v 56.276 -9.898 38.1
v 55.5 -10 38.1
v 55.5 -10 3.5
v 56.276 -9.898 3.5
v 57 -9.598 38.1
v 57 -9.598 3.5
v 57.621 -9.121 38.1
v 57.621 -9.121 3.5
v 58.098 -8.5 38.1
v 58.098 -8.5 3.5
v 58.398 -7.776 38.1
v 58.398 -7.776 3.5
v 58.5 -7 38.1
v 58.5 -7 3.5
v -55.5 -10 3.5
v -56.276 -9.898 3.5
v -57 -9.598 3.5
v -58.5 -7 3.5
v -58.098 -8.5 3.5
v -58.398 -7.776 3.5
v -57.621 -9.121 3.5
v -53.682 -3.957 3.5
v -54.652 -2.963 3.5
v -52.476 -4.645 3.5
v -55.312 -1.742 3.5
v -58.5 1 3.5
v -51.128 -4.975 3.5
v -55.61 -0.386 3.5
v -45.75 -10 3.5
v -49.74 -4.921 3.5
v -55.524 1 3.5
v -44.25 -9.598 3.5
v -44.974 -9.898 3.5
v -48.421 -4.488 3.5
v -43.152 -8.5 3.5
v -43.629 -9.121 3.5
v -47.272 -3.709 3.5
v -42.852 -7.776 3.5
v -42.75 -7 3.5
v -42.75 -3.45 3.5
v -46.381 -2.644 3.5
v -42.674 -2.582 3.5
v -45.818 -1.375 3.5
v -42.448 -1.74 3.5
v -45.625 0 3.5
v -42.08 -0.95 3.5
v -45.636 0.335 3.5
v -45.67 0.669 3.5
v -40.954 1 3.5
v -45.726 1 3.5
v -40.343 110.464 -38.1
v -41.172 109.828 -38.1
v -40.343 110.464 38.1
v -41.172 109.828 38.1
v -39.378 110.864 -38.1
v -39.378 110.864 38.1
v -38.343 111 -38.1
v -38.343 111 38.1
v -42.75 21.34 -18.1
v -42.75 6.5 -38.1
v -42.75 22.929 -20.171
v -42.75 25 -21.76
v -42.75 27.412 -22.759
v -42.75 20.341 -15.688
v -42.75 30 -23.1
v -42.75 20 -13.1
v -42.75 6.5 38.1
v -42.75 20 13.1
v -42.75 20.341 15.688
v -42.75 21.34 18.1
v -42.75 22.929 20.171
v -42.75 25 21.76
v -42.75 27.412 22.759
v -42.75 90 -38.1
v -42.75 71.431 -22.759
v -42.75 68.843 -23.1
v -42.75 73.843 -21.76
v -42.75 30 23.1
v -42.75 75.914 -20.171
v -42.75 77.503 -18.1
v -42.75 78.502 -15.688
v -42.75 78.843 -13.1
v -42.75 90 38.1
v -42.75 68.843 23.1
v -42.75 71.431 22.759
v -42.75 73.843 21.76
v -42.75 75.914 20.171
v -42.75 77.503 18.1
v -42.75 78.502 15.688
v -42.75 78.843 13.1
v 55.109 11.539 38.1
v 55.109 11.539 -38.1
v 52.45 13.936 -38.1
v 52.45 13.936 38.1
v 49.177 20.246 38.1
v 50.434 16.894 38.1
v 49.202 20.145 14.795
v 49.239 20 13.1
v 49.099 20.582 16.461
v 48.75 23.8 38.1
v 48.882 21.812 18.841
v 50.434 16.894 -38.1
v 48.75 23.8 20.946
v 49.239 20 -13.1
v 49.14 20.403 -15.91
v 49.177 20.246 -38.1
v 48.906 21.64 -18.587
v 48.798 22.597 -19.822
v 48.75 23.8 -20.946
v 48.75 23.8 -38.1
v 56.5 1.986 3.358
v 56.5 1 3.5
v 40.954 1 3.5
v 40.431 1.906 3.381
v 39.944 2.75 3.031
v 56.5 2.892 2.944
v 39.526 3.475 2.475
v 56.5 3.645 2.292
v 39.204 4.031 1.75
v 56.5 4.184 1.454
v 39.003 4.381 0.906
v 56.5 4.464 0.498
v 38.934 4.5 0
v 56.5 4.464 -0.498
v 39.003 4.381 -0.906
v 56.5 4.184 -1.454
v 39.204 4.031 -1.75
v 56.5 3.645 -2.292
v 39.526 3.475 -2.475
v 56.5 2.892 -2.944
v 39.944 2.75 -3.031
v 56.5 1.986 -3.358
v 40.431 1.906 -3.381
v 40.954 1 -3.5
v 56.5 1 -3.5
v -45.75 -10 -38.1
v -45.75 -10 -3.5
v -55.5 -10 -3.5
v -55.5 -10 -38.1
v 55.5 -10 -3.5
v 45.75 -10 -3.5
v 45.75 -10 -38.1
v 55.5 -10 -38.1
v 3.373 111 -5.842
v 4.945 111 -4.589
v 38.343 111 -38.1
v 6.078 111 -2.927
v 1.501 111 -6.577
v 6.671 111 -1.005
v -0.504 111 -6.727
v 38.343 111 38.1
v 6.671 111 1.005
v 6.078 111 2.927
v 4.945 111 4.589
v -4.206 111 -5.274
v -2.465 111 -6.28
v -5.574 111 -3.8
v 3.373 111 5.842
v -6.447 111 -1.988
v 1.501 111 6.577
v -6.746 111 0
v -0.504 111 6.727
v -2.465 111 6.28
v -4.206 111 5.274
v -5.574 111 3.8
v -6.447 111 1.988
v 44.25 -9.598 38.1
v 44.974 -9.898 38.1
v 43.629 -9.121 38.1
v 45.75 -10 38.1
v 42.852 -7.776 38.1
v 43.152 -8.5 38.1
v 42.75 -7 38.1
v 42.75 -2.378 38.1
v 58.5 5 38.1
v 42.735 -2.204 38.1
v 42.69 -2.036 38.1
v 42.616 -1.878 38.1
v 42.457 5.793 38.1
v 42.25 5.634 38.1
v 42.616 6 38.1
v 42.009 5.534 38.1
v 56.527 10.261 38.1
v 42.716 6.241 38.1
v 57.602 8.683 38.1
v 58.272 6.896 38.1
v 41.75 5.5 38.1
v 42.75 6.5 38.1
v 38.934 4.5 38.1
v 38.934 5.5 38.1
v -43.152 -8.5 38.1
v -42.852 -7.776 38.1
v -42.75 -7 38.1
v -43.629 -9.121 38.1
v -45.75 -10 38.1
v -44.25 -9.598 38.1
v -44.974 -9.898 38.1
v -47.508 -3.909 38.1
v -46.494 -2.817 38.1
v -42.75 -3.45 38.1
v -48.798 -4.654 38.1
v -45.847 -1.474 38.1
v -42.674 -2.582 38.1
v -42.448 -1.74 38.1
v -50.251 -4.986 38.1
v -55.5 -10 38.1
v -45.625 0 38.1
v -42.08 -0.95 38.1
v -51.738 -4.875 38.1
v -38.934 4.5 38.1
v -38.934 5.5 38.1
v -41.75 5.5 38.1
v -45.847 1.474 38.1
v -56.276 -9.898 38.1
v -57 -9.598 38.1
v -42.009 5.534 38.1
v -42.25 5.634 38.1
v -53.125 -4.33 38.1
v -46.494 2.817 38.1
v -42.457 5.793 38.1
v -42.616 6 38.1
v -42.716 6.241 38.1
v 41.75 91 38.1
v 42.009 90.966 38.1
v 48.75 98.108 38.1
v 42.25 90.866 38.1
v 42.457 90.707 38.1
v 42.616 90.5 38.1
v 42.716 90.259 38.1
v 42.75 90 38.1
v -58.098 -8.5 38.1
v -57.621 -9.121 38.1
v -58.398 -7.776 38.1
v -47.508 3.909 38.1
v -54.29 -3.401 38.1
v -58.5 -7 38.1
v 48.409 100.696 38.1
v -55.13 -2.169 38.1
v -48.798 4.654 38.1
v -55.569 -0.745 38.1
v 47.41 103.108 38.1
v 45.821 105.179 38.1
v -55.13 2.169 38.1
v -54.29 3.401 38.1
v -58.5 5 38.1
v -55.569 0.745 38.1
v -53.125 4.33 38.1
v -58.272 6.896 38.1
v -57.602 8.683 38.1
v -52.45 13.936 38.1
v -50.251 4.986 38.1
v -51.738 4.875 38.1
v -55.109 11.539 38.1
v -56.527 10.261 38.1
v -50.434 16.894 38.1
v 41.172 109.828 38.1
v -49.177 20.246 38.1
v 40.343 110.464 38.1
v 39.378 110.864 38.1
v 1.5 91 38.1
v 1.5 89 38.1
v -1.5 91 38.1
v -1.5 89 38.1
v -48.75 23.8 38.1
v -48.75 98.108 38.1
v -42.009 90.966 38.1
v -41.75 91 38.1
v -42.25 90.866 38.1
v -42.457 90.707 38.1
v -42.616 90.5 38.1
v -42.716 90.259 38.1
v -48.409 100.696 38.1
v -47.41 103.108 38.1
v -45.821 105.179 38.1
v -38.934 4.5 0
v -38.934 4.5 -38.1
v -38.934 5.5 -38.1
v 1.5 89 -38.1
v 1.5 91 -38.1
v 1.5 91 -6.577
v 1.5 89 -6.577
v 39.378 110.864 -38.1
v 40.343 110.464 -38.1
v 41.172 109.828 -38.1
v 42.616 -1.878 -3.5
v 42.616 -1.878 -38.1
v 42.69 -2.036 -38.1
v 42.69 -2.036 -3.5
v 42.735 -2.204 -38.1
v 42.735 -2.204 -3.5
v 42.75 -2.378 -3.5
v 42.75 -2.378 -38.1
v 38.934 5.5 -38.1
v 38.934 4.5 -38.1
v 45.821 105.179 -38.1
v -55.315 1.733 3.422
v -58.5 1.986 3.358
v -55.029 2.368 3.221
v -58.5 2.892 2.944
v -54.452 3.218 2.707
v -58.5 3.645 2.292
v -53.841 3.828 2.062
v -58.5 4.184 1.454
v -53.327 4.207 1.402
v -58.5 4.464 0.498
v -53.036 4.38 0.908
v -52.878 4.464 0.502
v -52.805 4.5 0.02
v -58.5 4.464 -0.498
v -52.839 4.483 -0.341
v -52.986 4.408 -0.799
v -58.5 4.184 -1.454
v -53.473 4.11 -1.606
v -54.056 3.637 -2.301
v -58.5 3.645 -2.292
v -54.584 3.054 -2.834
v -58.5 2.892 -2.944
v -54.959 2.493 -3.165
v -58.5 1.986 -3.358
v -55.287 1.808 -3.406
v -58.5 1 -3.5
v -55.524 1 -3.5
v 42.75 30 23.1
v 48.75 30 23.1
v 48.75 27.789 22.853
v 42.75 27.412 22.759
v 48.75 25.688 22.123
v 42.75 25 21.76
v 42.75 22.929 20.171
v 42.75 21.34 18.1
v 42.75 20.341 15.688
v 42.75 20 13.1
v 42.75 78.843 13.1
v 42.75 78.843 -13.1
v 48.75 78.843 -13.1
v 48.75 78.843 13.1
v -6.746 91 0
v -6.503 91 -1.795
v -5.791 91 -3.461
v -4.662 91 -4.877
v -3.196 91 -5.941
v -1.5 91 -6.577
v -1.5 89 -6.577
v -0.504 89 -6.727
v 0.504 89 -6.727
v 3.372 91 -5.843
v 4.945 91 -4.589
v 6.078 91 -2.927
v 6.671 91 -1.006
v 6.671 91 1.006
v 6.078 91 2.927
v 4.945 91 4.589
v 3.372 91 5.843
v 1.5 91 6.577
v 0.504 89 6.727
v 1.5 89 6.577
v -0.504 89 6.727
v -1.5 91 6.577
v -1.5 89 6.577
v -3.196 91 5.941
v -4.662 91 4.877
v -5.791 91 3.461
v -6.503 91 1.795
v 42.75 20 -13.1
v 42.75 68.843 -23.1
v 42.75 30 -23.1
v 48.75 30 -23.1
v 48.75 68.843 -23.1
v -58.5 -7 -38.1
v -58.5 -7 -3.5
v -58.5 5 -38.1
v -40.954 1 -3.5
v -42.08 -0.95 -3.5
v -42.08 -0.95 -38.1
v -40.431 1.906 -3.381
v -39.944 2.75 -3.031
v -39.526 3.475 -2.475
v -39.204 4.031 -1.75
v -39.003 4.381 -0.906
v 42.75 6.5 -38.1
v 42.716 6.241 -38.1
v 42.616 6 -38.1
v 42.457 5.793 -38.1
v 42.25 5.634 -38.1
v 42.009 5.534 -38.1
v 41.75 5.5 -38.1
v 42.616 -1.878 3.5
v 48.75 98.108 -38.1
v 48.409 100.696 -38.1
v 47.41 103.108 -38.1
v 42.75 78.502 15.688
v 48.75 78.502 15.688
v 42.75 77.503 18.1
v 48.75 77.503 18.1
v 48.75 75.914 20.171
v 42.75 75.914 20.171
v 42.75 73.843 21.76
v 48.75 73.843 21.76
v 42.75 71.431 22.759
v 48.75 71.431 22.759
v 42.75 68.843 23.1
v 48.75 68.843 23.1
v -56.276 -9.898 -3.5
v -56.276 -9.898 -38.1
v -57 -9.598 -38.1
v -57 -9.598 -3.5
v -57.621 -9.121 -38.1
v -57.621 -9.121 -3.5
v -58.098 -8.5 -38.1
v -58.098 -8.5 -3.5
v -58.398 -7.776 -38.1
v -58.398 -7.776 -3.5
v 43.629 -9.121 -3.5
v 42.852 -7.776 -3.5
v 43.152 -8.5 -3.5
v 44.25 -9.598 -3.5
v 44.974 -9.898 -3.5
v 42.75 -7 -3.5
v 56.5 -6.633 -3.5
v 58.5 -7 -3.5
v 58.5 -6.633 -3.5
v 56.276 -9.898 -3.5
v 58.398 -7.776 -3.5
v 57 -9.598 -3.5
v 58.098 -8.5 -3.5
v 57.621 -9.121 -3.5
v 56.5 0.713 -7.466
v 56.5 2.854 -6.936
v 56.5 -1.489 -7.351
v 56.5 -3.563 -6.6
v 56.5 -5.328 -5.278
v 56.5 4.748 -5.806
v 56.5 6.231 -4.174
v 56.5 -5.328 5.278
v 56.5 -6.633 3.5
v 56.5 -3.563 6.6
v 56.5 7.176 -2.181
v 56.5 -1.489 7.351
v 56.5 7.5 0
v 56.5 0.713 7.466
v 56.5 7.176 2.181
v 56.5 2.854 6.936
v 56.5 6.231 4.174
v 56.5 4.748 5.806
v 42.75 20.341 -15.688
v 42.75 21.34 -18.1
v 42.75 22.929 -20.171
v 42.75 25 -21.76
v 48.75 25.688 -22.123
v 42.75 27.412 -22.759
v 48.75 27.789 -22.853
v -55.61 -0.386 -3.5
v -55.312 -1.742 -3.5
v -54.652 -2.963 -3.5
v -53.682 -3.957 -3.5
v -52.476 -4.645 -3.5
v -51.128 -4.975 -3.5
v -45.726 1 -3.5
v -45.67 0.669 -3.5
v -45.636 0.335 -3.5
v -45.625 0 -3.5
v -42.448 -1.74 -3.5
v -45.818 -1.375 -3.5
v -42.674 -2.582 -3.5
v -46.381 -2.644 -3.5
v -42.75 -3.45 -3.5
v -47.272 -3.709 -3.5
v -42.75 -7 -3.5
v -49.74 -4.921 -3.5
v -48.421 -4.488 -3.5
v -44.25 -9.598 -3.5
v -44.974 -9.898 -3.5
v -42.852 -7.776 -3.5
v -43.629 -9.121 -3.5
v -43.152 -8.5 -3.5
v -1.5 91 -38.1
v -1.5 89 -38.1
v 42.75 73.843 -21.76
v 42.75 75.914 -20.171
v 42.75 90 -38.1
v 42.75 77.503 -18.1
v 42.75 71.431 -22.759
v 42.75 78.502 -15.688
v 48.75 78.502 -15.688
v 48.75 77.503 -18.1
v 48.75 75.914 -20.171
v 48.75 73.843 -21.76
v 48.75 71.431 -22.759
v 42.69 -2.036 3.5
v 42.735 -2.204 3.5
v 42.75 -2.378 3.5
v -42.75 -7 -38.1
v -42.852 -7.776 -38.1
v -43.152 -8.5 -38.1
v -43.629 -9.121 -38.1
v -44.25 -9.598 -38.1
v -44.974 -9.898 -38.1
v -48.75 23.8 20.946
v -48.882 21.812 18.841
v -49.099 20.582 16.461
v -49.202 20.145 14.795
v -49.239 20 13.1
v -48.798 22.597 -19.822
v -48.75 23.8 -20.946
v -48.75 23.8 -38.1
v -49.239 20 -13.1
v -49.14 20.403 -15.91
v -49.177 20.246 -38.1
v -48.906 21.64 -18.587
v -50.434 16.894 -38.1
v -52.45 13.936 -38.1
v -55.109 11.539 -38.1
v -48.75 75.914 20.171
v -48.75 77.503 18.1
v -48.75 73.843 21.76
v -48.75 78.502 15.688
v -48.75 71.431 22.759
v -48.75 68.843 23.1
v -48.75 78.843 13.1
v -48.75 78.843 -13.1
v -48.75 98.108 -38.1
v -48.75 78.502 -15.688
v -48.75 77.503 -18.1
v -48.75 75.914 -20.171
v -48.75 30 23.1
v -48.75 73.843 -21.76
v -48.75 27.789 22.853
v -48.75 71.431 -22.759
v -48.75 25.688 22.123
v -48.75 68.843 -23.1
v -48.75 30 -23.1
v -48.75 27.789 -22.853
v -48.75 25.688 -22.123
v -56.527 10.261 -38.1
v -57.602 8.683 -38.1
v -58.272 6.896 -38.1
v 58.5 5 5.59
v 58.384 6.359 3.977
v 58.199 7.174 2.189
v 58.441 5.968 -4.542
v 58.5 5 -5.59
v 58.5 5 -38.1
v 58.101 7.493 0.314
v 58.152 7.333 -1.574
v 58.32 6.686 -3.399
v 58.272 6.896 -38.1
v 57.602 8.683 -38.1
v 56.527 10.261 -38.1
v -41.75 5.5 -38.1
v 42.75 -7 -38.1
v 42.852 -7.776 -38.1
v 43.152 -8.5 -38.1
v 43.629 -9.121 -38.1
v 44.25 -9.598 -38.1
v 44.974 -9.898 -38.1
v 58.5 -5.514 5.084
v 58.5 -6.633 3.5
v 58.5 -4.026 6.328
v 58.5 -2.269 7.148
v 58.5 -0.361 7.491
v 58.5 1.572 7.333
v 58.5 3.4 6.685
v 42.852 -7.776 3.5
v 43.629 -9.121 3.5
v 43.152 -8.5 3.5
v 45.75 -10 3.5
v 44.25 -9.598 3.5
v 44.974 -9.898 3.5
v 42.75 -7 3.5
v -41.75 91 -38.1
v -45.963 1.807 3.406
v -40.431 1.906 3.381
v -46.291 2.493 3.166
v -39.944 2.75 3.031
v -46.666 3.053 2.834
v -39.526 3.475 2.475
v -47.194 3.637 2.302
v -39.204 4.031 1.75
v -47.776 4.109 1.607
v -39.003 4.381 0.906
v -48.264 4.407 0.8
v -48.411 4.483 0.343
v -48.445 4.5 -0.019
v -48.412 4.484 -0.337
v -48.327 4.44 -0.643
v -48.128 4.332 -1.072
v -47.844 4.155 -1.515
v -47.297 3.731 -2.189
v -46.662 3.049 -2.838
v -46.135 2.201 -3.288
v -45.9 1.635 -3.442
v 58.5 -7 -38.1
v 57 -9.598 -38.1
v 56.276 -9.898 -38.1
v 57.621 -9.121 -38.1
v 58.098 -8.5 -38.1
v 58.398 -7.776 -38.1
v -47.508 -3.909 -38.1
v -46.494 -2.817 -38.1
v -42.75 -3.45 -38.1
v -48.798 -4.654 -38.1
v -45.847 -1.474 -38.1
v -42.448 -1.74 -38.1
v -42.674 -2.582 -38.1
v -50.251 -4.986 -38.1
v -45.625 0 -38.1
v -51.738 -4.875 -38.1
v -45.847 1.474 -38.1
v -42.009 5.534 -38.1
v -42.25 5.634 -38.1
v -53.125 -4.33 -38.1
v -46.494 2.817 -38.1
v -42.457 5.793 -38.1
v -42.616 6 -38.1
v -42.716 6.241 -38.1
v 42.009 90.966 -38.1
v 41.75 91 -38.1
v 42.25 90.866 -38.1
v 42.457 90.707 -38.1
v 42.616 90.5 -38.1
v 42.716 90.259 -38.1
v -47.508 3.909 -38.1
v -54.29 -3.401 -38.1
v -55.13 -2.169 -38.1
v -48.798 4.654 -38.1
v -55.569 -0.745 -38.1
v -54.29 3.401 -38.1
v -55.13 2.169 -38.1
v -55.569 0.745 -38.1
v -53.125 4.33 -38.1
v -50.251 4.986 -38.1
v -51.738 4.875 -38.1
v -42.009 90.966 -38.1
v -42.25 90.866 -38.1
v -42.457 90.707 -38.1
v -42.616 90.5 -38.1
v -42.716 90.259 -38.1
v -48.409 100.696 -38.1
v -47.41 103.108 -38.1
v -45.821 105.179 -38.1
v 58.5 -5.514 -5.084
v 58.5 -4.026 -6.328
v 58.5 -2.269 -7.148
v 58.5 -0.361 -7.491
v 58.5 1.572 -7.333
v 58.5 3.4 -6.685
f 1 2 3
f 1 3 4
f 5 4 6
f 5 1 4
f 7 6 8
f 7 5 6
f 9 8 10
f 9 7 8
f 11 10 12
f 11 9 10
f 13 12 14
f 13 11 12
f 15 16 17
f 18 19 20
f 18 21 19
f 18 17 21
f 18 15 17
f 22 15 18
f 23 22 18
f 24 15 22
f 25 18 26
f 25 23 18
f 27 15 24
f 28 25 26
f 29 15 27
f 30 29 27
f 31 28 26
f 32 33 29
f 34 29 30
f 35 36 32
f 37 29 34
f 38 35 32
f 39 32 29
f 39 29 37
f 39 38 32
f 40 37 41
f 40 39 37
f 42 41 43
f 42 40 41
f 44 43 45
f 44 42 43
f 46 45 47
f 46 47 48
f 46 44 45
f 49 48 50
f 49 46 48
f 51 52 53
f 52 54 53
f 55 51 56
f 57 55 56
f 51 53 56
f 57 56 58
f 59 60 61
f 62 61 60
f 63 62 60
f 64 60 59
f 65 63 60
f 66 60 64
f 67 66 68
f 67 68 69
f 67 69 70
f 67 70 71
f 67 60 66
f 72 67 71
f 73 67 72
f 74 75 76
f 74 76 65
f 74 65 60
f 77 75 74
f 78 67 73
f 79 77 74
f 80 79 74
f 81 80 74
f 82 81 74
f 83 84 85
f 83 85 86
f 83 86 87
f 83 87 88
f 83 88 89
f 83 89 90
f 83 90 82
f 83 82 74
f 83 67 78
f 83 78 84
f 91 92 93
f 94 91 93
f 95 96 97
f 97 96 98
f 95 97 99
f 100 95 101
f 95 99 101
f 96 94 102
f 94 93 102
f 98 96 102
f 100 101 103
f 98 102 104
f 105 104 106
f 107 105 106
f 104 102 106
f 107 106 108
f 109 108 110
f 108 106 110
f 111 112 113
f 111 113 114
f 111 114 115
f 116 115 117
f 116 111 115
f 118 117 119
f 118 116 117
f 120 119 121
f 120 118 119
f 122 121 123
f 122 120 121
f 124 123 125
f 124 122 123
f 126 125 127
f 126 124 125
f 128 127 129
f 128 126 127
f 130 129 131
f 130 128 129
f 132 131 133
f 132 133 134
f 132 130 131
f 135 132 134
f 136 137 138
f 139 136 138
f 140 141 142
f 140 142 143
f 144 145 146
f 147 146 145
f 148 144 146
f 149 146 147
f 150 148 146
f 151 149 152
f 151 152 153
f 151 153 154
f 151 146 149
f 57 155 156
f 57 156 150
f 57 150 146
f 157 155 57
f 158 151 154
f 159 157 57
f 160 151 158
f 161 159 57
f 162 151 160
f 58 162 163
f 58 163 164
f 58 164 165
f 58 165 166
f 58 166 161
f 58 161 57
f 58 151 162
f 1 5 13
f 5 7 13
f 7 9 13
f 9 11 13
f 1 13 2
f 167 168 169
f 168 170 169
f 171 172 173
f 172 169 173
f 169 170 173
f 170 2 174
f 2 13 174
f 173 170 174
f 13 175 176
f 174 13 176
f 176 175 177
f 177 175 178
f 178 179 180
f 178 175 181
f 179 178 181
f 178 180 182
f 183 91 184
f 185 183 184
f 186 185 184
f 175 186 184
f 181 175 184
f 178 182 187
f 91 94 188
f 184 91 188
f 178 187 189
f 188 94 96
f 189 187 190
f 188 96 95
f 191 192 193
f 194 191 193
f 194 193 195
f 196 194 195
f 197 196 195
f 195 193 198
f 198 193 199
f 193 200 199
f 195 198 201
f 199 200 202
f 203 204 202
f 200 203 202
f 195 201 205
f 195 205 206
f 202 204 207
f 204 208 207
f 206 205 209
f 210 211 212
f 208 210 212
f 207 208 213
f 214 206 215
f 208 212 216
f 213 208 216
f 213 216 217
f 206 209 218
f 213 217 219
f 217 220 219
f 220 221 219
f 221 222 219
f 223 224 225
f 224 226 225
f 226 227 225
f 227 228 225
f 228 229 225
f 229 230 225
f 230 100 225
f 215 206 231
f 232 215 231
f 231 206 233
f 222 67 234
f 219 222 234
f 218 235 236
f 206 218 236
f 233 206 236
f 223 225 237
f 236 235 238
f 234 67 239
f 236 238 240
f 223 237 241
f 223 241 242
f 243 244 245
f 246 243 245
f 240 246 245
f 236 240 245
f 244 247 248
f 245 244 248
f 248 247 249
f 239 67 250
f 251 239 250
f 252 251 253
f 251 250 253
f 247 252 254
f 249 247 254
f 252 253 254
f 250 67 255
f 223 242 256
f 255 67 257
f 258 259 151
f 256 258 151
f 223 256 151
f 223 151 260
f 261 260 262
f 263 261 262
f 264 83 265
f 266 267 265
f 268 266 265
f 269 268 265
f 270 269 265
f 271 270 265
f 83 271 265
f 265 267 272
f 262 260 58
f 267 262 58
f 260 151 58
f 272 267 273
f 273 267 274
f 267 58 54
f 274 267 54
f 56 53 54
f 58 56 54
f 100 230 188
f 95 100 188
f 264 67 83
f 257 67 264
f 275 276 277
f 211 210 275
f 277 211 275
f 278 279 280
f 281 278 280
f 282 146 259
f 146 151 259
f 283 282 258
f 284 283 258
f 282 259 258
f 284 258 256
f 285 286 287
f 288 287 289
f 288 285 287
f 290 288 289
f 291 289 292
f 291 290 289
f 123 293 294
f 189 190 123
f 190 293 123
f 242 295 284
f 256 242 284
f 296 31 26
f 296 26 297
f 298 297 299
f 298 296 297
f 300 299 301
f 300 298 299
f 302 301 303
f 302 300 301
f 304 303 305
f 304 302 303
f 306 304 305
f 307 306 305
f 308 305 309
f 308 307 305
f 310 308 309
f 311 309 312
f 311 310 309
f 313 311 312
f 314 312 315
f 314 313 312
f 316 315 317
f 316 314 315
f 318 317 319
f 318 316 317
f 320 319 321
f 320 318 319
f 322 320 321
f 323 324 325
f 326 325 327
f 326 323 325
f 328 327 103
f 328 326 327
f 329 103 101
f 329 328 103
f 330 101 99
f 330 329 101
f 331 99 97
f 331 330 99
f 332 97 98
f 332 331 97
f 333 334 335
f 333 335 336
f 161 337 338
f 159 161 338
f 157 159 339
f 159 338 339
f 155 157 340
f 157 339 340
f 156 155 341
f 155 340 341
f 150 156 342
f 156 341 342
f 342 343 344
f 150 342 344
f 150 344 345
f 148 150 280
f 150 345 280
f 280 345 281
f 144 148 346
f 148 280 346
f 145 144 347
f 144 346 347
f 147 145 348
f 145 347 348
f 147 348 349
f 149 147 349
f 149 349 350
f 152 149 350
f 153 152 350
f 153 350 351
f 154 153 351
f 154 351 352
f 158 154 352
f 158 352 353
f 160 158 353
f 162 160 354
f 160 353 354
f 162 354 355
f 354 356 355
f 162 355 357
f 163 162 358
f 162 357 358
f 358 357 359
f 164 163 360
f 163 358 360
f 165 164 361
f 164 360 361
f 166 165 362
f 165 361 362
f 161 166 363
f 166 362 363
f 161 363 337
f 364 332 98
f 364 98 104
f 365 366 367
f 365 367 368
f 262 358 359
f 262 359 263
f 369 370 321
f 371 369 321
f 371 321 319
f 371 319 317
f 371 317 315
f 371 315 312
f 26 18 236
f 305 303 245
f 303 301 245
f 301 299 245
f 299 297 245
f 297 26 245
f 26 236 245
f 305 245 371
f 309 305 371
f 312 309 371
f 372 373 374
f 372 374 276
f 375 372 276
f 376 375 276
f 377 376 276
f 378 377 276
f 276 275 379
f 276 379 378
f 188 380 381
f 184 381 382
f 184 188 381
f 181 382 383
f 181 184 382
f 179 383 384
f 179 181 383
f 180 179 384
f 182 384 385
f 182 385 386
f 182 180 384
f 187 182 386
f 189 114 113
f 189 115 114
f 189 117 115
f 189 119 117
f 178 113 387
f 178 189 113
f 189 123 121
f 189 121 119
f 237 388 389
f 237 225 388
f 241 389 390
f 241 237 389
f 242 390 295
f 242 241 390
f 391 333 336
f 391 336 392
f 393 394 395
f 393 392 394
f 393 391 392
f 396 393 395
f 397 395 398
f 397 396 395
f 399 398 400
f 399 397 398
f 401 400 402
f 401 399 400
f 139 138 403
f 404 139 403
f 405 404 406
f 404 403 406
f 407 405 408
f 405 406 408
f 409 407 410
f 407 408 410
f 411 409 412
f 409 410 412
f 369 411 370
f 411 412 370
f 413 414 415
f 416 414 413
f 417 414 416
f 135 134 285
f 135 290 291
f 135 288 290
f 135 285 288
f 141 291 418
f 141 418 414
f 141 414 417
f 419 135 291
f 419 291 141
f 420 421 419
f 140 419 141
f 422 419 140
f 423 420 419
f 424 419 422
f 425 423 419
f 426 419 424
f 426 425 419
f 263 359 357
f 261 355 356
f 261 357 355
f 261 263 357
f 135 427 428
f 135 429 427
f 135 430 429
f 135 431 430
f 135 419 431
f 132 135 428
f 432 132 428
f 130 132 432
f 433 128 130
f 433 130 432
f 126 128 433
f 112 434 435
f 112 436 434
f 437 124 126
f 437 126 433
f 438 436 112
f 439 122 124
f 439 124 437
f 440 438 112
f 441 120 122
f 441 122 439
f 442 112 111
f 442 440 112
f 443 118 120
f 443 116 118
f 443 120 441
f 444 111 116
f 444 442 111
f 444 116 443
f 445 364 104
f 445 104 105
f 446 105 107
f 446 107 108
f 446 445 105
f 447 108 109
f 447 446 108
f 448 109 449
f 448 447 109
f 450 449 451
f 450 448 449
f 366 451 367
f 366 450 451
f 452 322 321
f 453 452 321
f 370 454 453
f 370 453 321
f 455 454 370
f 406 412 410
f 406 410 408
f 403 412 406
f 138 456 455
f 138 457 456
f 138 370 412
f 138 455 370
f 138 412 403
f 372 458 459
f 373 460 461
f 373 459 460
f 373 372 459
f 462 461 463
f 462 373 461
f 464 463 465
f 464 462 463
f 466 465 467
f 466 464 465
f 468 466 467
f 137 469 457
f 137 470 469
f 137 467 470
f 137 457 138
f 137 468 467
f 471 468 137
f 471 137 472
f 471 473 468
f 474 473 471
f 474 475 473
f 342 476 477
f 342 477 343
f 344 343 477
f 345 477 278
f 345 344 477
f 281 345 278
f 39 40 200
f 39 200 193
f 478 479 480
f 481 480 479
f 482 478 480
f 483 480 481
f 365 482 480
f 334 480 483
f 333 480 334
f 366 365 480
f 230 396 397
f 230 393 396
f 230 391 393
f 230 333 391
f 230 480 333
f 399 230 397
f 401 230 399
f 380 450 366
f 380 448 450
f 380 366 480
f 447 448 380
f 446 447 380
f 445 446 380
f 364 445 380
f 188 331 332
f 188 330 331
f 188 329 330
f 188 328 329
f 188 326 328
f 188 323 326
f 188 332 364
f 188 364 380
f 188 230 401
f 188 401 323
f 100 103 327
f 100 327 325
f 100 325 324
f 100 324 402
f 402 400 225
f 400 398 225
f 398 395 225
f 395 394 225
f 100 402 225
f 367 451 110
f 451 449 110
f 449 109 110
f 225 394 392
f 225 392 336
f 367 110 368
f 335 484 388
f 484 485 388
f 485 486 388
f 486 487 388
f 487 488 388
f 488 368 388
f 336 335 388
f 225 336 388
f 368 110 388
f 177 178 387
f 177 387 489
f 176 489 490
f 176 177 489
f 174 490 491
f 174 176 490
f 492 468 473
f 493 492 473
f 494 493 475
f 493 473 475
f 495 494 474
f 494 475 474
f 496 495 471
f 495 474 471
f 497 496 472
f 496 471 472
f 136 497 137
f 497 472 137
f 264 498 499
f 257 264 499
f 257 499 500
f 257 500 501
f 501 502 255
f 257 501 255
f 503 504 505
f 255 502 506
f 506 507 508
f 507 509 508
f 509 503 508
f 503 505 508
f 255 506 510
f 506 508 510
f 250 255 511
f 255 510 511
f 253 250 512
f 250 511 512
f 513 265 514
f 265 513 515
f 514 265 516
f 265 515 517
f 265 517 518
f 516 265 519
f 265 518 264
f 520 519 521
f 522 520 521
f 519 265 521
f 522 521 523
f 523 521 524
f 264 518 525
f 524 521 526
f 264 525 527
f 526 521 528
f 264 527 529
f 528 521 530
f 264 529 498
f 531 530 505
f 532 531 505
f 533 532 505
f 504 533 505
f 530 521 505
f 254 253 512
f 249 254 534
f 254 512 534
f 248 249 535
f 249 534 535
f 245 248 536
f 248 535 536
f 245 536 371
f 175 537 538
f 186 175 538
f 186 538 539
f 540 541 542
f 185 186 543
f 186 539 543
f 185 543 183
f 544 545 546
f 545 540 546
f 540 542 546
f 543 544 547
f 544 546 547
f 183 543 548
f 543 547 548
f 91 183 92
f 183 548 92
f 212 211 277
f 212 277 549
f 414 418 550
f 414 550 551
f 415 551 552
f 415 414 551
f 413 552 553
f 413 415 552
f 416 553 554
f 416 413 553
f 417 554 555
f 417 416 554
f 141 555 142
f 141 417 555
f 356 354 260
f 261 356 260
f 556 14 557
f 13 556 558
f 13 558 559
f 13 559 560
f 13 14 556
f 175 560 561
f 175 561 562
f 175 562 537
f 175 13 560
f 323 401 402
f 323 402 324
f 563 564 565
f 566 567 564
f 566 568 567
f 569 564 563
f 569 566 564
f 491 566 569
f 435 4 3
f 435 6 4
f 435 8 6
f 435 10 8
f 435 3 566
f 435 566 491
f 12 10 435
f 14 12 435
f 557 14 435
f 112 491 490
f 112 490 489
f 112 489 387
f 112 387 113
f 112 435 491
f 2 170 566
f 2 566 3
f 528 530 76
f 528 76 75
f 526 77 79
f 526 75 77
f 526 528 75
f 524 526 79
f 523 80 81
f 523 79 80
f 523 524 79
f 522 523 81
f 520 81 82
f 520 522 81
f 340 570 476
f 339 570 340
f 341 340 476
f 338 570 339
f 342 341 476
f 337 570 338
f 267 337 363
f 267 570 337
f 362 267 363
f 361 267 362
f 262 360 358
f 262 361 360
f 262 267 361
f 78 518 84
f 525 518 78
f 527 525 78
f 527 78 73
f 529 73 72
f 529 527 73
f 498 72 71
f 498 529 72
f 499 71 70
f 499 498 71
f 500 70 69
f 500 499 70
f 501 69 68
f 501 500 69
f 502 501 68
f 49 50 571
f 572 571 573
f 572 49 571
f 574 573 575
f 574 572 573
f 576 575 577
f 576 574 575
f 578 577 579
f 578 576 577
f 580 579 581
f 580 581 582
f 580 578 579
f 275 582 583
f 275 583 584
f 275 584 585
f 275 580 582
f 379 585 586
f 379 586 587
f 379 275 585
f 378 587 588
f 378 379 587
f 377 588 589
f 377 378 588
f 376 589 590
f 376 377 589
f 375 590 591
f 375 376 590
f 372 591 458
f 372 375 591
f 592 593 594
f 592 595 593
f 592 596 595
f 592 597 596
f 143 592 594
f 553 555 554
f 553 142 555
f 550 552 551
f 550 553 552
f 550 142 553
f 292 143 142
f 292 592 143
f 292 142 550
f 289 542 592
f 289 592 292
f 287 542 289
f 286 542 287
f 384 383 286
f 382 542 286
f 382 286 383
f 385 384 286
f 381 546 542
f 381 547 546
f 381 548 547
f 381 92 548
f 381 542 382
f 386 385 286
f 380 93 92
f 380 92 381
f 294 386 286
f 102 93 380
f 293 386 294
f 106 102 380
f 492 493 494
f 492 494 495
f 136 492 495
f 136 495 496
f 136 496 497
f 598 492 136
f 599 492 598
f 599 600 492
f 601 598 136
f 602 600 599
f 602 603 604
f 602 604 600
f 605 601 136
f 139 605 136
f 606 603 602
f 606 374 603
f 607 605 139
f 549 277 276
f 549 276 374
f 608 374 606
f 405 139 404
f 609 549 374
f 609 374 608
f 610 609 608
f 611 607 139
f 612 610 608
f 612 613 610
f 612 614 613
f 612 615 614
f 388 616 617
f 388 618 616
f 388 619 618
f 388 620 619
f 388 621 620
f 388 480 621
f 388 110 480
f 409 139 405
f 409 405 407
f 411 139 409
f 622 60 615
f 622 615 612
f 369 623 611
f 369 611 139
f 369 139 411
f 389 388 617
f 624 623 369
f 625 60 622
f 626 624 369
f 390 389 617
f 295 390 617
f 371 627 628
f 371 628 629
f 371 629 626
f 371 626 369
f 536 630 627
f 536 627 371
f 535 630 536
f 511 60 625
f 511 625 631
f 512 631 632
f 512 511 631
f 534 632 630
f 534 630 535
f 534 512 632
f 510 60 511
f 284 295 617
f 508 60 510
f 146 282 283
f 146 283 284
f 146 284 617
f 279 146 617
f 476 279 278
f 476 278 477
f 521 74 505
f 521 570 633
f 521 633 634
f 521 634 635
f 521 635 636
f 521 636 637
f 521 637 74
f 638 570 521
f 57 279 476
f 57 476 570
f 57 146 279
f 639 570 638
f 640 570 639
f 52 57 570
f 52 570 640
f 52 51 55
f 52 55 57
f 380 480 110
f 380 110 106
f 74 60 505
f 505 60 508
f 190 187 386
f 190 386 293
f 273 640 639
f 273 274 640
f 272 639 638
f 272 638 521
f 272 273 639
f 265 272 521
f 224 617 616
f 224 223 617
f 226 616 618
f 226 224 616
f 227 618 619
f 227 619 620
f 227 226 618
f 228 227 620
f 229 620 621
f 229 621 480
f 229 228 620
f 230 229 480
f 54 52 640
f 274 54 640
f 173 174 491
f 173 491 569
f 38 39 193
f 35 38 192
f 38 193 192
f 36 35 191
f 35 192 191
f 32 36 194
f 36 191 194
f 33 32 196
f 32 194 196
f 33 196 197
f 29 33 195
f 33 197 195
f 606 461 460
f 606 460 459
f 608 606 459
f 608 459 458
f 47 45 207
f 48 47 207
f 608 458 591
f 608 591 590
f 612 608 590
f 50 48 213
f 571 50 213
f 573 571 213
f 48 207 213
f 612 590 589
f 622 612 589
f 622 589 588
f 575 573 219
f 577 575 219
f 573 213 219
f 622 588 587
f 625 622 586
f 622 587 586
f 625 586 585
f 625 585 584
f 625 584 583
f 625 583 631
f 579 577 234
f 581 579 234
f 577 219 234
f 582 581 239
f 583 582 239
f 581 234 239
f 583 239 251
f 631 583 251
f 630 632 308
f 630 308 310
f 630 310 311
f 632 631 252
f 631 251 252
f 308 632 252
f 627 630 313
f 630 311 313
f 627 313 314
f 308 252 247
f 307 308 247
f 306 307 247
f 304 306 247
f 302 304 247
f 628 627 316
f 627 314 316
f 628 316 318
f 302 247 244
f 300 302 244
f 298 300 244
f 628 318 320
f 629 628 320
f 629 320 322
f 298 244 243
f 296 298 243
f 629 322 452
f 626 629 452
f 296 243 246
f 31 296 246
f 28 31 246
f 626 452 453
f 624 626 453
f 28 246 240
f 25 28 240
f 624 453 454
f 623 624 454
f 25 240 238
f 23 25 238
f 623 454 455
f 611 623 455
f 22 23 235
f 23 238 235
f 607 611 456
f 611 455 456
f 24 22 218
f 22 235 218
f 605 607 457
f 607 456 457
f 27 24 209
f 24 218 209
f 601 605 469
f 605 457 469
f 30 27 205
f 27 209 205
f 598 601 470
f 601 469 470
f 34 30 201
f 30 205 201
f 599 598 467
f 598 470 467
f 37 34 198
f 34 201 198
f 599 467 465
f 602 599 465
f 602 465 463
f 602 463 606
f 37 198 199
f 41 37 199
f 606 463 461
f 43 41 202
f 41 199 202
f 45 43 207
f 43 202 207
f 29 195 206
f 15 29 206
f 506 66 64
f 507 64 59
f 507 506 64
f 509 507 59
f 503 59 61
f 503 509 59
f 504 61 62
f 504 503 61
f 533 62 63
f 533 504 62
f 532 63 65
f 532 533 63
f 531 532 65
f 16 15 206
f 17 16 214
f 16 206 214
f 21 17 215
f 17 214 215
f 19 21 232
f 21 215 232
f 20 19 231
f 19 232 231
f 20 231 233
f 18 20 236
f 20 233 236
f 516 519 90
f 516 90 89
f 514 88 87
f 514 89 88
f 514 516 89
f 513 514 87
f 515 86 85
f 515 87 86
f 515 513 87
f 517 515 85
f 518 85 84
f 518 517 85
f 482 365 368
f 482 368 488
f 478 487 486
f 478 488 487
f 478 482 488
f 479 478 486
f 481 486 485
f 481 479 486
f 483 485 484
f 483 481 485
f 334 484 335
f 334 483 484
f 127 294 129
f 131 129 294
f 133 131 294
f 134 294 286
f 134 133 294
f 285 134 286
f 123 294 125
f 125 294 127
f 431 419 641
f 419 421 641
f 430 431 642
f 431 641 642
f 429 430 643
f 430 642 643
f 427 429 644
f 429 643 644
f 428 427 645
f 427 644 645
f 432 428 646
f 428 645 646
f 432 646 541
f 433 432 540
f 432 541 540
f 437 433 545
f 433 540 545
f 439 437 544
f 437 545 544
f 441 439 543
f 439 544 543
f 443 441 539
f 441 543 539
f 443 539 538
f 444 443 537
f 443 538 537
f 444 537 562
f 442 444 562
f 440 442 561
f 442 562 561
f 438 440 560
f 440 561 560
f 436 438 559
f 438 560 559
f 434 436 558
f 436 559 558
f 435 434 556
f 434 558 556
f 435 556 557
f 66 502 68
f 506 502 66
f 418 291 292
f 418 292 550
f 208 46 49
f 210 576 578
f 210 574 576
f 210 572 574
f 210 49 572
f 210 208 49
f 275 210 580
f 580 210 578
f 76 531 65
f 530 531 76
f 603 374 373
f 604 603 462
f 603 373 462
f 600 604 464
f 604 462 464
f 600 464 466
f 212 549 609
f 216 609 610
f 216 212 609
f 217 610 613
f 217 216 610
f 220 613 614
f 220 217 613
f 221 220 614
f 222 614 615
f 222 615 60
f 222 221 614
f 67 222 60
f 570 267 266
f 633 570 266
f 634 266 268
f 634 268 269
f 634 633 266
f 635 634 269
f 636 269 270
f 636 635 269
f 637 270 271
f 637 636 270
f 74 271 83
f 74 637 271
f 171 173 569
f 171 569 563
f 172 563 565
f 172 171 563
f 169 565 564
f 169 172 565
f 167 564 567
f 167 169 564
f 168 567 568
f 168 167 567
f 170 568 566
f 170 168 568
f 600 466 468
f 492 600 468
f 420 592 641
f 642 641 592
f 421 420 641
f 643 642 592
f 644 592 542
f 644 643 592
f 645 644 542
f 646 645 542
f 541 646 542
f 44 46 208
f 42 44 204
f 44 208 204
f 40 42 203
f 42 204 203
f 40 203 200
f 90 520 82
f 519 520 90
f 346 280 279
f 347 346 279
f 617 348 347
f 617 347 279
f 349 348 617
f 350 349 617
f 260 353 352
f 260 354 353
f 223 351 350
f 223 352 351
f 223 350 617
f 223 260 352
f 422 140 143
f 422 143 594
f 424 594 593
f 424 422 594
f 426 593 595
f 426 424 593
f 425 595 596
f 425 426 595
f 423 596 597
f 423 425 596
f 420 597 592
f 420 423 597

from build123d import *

# Parameters (mm, degrees)
BOSS_EXTRUDE1_DEPTH     = 38.1
SKETCH4_R               = 5
CUT_EXTRUDE2_DEPTH      = 147.798126691
FILLET1_R               = 1
FILLET2_R               = 4
BOSS_EXTRUDE5_START     = -76.2
BOSS_EXTRUDE5_DEPTH     = 76.2
SKETCH9_R               = 7.5
CUT_EXTRUDE3_DEPTH      = 2
SKETCH10_W              = 3
SKETCH10_H              = 76.2
BOSS_EXTRUDE4_DEPTH     = 2
CUT_EXTRUDE1_DEPTH      = 166.715448911
CUT_EXTRUDE8_DEPTH      = 166.715448911
CUT_EXTRUDE10_DEPTH     = 147.798126783
F_5_8_11_TAPPED_HOLE1_D = 13.49248
FILLET3_R               = 10


with BuildPart() as part:
    # Sketch1 → Boss-Extrude1 (new, symmetric)
    with BuildSketch(Plane.XY):
        with BuildLine():
            Line((-42.75, 91), (42.75, 91))
            Line((42.75, 91), (42.75, 6.5))
            ThreePointArc((42.75, 6.5), (42.457106781, 5.792893219), (41.75, 5.5))
            Line((41.75, 5.5), (38.933657049, 5.5))
            Line((38.933657049, 5.5), (38.933657049, 4.5))
            Line((38.933657049, 4.5), (42.616025404, -1.878049083))
            ThreePointArc((42.616025404, -1.878049083), (42.715925826, -2.119230038), (42.75, -2.378049083))
            Line((42.75, -2.378049083), (42.75, -7))
            ThreePointArc((42.75, -7), (43.628679656, -9.121320344), (45.75, -10))
            Line((45.75, -10), (55.5, -10))
            ThreePointArc((55.5, -10), (57.621320344, -9.121320344), (58.5, -7))
            Line((58.5, -7), (58.5, 92.5))
            Line((58.5, 92.5), (40, 111))
            Line((40, 111), (-40, 111))
            Line((-40, 111), (-58.5, 92.5))
            Line((-58.5, 92.5), (-58.5, 0))
            ThreePointArc((-58.5, 0), (-52.66319998, -7.606665882), (-43.805049945, -3.9375))
            Line((-43.805049945, -3.9375), (-38.933657049, 4.5))
            Line((-38.933657049, 4.5), (-38.933657049, 5.5))
            Line((-38.933657049, 5.5), (-41.75, 5.5))
            ThreePointArc((-41.75, 5.5), (-42.457106781, 5.792893219), (-42.75, 6.5))
            Line((-42.75, 6.5), (-42.75, 91))
        make_face()
    extrude(amount=BOSS_EXTRUDE1_DEPTH, both=True)

    # Sketch4 → Cut-Extrude2 (cut, through all)
    with BuildSketch(Plane.XY.offset(38.1)):
        with Locations((-50.625, 0)):
            Circle(SKETCH4_R)
    extrude(amount=-CUT_EXTRUDE2_DEPTH, mode=Mode.SUBTRACT)

    # Fillet1
    fillet1_edges = [part.edges().sort_by_distance(p)[0] for p in [
        (42.75, 91, 0),
        (-42.75, 91, 0),
    ]]
    fillet(fillet1_edges, radius=FILLET1_R)

    # Fillet2
    fillet2_edges = [part.edges().sort_by_distance(p)[0] for p in [
        (-58.5, 92.5, 0),
        (-40, 111, 0),
        (40, 111, 0),
        (58.5, 92.5, 0),
    ]]
    fillet(fillet2_edges, radius=FILLET2_R)

    # Sketch14 → Boss-Extrude5 (add)
    with BuildSketch(Plane(origin=(0, 0, -38.1), x_dir=(-1, 0, 0), z_dir=(0, 0, -1)).offset(BOSS_EXTRUDE5_START)):
        with BuildLine():
            Line((45.75, -10), (55.5, -10))
            ThreePointArc((55.5, -10), (57.621320344, -9.121320344), (58.5, -7))
            Line((58.5, -7), (58.5, 0))
            ThreePointArc((58.5, 0), (52.66319998, -7.606665882), (43.805049945, -3.9375))
            Line((43.805049945, -3.9375), (42.080127019, -0.949845853))
            ThreePointArc((42.080127019, -0.949845853), (42.579629131, -2.155750627), (42.75, -3.449845853))
            Line((42.75, -3.449845853), (42.75, -7))
            ThreePointArc((42.75, -7), (43.628679656, -9.121320344), (45.75, -10))
        make_face()
    extrude(amount=BOSS_EXTRUDE5_DEPTH)

    # Sketch9 → Cut-Extrude3 (cut)
    with BuildSketch(Plane(origin=(58.5, 0, 0), x_dir=(0, 0, -1), z_dir=(1, 0, 0))):
        with Locations(Location((0, 0, 0), (0, 0, 90))):
            Circle(SKETCH9_R)
    extrude(amount=-CUT_EXTRUDE3_DEPTH, mode=Mode.SUBTRACT)

    # Sketch10 → Boss-Extrude4 (add)
    with BuildSketch(Plane.XZ.offset(-91)):
        Rectangle(SKETCH10_W, SKETCH10_H)
    extrude(amount=BOSS_EXTRUDE4_DEPTH)

    # Sketch3 → Cut-Extrude1 (cut, through all)
    with BuildSketch(Plane(origin=(58.5, 0, 0), x_dir=(0, 0, -1), z_dir=(1, 0, 0))):
        with BuildLine():
            Line((3.5, 1), (3.5, -10))
            ThreePointArc((3.5, -10), (0, -13.5), (-3.5, -10))
            Line((-3.5, -10), (-3.5, 1))
            ThreePointArc((-3.5, 1), (0, 4.5), (3.5, 1))
        make_face()
    extrude(amount=-CUT_EXTRUDE1_DEPTH, mode=Mode.SUBTRACT)

    # Sketch18 → Cut-Extrude8 (cut, through all)
    with BuildSketch(Plane.ZY.offset(58.5)):
        with BuildLine():
            Line((-13.1, 78.843145751), (13.1, 78.843145751))
            ThreePointArc((13.1, 78.843145751), (20.171067812, 75.914213562), (23.1, 68.843145751))
            Line((23.1, 68.843145751), (23.1, 30))
            ThreePointArc((23.1, 30), (20.171067812, 22.928932188), (13.1, 20))
            Line((13.1, 20), (-13.1, 20))
            ThreePointArc((-13.1, 20), (-20.171067812, 22.928932188), (-23.1, 30))
            Line((-23.1, 30), (-23.1, 68.843145751))
            ThreePointArc((-23.1, 68.843145751), (-20.171067812, 75.914213562), (-13.1, 78.843145751))
        make_face()
    extrude(amount=-CUT_EXTRUDE8_DEPTH, mode=Mode.SUBTRACT)

    # Sketch22 → Cut-Extrude10 (cut, through all)
    with BuildSketch(Plane(origin=(0, 0, -38.1), x_dir=(-1, 0, 0), z_dir=(0, 0, -1))):
        with BuildLine():
            Line((48.75, 102.25), (48.75, 23.799933511))
            ThreePointArc((48.75, 23.799933511), (50.434228051, 16.894123103), (55.108695652, 11.539107308))
            ThreePointArc((55.108695652, 11.539107308), (57.60174504, 8.683098884), (58.5, 5))
            Line((58.5, 5), (58.5, 90.843145751))
            ThreePointArc((58.5, 90.843145751), (58.19551813, 92.37387948), (57.328427125, 93.671572875))
            Line((57.328427125, 93.671572875), (48.75, 102.25))
        make_face()
        with BuildLine():
            Line((-48.75, 23.799933511), (-48.75, 102.25))
            Line((-48.75, 102.25), (-57.328427125, 93.671572875))
            ThreePointArc((-57.328427125, 93.671572875), (-58.19551813, 92.37387948), (-58.5, 90.843145751))
            Line((-58.5, 90.843145751), (-58.5, 5))
            ThreePointArc((-58.5, 5), (-57.60174504, 8.683098884), (-55.108695652, 11.539107308))
            ThreePointArc((-55.108695652, 11.539107308), (-50.434228051, 16.894123103), (-48.75, 23.799933511))
        make_face()
    extrude(amount=-CUT_EXTRUDE10_DEPTH, mode=Mode.SUBTRACT)

    # 5/8-11 Tapped Hole1 (through all)
    with Locations(Plane(origin=(0, 111, 0), x_dir=(1, 0, 0), z_dir=(0, 1, 0))):
        with Locations((0, 0)):
            Hole(F_5_8_11_TAPPED_HOLE1_D / 2)

    # Fillet3
    fillet3_edges = [part.edges().sort_by_distance(p)[0] for p in [
        (-48.75, 102.25, 0),
        (48.75, 102.25, 0),
    ]]
    fillet(fillet3_edges, radius=FILLET3_R)


solid = part.part
